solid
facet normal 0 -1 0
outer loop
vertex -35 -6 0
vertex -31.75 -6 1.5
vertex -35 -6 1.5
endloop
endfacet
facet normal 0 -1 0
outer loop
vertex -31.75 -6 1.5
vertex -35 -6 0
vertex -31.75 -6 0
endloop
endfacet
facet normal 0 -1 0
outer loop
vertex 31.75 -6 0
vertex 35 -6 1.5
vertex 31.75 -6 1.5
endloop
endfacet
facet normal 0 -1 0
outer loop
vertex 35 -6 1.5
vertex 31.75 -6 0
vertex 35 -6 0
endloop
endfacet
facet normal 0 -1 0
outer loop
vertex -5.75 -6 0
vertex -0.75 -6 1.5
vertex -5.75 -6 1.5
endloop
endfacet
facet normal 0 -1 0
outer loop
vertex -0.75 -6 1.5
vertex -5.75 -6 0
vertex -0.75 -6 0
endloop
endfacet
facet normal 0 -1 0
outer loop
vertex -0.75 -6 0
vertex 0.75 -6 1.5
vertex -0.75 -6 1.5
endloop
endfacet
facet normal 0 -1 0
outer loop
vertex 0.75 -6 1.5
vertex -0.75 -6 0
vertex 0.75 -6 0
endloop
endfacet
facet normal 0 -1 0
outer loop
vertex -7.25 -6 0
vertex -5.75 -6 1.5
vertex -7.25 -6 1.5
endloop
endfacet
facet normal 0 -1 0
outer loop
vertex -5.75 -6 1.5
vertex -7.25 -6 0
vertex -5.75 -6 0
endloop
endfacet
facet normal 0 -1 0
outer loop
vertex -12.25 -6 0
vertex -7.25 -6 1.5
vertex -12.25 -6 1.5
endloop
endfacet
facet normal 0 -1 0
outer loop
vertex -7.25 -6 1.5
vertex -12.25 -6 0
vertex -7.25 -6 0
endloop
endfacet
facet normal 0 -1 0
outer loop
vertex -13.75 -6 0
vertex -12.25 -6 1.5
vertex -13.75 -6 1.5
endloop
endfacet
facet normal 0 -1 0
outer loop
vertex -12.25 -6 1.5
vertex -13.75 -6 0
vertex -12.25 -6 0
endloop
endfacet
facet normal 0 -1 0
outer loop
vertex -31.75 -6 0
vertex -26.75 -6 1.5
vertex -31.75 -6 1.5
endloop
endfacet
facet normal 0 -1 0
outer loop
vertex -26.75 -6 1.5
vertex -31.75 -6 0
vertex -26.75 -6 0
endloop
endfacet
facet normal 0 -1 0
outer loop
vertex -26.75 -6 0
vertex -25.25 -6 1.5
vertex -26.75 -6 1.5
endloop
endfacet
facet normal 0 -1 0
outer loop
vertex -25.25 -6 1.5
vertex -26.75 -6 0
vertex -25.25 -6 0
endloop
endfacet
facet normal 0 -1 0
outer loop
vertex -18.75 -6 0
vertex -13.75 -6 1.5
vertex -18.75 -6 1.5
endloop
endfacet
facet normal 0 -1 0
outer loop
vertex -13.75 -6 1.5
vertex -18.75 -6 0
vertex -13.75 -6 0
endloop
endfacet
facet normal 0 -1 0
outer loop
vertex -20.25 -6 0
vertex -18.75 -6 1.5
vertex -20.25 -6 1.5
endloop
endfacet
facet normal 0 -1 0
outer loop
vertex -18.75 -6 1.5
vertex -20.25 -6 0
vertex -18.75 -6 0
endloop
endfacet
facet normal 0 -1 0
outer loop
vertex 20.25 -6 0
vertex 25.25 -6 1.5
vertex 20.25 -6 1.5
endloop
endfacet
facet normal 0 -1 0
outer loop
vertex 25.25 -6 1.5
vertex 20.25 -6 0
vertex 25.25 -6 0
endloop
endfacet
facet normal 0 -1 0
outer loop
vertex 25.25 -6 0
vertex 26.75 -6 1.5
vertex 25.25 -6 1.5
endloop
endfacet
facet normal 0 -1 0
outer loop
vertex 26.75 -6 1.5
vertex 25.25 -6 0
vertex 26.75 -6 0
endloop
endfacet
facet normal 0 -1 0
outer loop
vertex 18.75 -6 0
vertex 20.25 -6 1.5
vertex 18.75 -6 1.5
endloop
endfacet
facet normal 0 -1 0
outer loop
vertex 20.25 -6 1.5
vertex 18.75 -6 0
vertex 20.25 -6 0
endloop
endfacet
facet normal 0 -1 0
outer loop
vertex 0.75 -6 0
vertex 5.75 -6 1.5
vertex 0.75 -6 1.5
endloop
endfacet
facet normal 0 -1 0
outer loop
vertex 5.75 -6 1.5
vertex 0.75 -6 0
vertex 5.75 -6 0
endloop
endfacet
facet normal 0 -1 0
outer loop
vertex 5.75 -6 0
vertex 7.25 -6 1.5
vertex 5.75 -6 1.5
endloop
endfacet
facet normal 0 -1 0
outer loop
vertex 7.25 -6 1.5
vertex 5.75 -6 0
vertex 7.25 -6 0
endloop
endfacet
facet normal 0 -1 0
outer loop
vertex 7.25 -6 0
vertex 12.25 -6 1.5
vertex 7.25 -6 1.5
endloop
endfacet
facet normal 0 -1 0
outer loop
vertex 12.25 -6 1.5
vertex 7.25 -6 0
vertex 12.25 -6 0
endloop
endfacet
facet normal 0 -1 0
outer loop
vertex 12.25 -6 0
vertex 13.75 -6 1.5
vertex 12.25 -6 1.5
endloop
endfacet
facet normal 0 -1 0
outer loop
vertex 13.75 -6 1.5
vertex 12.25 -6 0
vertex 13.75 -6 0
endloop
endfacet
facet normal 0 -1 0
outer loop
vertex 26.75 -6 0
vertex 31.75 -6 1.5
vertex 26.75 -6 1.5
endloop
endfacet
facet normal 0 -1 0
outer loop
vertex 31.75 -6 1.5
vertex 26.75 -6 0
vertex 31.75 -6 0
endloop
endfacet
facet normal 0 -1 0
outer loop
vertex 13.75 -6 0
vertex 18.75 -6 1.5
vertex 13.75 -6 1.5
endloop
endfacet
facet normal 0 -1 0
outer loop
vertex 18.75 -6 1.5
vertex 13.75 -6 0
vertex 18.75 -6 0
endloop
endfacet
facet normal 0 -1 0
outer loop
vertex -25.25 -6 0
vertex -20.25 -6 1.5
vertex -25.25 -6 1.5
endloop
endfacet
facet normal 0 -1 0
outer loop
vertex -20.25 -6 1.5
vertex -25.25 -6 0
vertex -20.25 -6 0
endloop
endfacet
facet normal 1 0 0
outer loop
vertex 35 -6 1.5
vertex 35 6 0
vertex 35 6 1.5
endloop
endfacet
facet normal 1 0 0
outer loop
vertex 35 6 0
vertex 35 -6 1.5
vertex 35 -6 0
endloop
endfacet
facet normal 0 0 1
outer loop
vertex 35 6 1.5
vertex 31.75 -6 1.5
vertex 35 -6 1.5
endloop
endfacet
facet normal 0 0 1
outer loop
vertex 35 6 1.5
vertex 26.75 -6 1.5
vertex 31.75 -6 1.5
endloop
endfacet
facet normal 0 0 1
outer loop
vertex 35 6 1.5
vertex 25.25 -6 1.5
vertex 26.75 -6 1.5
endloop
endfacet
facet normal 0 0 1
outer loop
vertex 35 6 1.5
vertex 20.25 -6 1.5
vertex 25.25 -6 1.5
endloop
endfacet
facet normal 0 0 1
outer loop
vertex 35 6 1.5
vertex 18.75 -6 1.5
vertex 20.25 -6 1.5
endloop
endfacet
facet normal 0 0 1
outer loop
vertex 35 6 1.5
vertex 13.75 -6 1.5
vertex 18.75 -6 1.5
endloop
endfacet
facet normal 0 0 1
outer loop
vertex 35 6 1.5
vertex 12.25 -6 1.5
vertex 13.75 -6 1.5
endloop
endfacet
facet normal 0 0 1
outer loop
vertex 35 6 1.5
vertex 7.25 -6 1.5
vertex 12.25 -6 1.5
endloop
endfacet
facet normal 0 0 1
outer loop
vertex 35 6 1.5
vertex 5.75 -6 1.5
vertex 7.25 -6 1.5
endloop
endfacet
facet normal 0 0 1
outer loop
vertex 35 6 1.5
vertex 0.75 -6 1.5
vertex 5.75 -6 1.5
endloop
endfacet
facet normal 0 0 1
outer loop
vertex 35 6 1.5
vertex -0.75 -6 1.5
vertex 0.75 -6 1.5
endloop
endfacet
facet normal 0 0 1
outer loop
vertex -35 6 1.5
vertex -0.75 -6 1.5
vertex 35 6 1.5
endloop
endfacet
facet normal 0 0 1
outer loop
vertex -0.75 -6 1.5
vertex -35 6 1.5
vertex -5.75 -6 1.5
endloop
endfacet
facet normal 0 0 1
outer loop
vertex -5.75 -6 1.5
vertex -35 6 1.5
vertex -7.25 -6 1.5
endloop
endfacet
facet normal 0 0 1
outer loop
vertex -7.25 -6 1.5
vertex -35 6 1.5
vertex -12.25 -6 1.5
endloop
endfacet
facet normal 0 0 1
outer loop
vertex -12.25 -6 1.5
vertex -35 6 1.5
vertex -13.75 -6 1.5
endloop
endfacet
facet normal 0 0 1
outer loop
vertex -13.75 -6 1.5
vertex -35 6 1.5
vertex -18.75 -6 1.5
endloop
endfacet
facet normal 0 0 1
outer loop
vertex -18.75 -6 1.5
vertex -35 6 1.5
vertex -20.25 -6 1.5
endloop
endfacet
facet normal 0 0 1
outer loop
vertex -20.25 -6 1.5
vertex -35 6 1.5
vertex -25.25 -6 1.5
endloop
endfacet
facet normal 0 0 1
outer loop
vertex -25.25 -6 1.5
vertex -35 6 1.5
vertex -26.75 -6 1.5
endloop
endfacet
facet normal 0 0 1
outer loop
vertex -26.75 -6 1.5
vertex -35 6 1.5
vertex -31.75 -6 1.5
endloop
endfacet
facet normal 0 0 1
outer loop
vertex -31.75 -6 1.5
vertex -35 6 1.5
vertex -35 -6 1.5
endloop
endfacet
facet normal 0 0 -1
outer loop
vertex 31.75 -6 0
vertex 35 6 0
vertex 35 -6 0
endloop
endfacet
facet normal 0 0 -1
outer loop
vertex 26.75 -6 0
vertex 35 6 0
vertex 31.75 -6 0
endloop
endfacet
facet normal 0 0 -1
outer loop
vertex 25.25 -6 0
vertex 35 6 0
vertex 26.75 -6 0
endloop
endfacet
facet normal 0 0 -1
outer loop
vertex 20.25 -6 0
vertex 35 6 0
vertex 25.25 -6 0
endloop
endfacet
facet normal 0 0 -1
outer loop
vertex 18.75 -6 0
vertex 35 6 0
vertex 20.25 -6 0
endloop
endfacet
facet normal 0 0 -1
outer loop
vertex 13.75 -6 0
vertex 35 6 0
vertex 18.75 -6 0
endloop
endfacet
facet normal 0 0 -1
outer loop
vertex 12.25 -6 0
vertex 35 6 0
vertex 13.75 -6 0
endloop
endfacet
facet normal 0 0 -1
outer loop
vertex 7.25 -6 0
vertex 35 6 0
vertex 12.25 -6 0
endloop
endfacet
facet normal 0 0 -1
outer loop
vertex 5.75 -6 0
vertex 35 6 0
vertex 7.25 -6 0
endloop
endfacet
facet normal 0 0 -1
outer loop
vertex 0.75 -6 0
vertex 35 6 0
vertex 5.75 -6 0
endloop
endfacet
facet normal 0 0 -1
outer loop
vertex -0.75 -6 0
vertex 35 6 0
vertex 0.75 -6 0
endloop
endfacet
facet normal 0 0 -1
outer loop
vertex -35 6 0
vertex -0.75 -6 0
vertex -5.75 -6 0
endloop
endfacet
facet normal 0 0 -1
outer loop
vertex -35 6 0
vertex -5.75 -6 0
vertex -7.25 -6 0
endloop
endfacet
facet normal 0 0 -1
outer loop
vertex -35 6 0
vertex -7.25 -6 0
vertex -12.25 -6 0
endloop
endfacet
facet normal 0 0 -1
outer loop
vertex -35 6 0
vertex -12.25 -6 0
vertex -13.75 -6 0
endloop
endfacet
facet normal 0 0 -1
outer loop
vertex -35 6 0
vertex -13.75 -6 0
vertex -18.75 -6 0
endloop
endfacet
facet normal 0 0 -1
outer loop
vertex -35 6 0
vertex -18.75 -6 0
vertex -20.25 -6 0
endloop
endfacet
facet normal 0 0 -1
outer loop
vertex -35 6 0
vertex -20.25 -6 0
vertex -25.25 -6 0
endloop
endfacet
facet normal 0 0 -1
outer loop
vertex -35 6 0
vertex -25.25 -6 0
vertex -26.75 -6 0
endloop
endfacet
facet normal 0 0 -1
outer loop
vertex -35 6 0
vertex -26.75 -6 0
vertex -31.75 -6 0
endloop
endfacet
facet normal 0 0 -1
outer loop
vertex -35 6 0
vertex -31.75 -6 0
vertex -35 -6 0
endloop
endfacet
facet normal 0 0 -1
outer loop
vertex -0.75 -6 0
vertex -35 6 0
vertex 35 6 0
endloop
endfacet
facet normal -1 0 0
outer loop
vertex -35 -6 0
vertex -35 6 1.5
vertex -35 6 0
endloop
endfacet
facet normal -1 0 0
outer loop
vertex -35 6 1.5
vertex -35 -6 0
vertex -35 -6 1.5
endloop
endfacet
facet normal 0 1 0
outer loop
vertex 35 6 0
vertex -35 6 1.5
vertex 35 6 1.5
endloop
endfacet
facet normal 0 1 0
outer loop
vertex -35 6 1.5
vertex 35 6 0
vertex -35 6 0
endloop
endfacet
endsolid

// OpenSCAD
// 10-well comb for casting agarose gels
// Printed lying flat: whole comb is a flat plate in XY, builds up in +Z

// ---------- Parameters ----------
well_count     = 10;    // number of wells (teeth)
plate_length   = 70;    // spine length along X (mm)
plate_width    = 12;    // spine width along Y (mm)
plate_thick    = 1.5;   // plate thickness along Z (mm)

tooth_width    = 5.0;   // tooth width along X (mm)
tooth_length   = 12;    // tooth length along Y (mm)
tooth_height   = 12;    // tooth height from top of spine (mm)

gap            = 1.5;   // gap between neighbouring teeth along X (mm)
overcut        = 0.5;   // extra length on cutting shapes past faces (mm)

$fn = 64;

// ---------- Derived ----------
pitch       = tooth_width + gap;               // centre-to-centre spacing
row_start_x = -(well_count - 1) * pitch / 2;   // first tooth centre (row centred)
top_z       = plate_thick + tooth_height;     // top of teeth / bottom of wells

// ---------- Model ----------
difference() {
    // Base plate (spine + tooth footprints)
    translate([-plate_length / 2, -plate_width / 2, 0])
        cube([plate_length, plate_width, plate_thick]);

    // Teeth hanging from the -Y edge of the spine
    for (i = [0 : well_count - 1]) {
        translate([row_start_x + i * pitch - tooth_width / 2,
                   -plate_width / 2 - tooth_height,
                   0])
            cube([tooth_width, tooth_length, plate_thick + tooth_height]);
    }

    // Wells cut through the top of each tooth (and into the spine)
    for (i = [0 : well_count - 1]) {
        translate([row_start_x + i * pitch - tooth_width / 2,
                   -plate_width / 2 + overcut,
                   top_z - overcut])
            cube([tooth_width, tooth_length, plate_thick + tooth_height]);
    }
}
